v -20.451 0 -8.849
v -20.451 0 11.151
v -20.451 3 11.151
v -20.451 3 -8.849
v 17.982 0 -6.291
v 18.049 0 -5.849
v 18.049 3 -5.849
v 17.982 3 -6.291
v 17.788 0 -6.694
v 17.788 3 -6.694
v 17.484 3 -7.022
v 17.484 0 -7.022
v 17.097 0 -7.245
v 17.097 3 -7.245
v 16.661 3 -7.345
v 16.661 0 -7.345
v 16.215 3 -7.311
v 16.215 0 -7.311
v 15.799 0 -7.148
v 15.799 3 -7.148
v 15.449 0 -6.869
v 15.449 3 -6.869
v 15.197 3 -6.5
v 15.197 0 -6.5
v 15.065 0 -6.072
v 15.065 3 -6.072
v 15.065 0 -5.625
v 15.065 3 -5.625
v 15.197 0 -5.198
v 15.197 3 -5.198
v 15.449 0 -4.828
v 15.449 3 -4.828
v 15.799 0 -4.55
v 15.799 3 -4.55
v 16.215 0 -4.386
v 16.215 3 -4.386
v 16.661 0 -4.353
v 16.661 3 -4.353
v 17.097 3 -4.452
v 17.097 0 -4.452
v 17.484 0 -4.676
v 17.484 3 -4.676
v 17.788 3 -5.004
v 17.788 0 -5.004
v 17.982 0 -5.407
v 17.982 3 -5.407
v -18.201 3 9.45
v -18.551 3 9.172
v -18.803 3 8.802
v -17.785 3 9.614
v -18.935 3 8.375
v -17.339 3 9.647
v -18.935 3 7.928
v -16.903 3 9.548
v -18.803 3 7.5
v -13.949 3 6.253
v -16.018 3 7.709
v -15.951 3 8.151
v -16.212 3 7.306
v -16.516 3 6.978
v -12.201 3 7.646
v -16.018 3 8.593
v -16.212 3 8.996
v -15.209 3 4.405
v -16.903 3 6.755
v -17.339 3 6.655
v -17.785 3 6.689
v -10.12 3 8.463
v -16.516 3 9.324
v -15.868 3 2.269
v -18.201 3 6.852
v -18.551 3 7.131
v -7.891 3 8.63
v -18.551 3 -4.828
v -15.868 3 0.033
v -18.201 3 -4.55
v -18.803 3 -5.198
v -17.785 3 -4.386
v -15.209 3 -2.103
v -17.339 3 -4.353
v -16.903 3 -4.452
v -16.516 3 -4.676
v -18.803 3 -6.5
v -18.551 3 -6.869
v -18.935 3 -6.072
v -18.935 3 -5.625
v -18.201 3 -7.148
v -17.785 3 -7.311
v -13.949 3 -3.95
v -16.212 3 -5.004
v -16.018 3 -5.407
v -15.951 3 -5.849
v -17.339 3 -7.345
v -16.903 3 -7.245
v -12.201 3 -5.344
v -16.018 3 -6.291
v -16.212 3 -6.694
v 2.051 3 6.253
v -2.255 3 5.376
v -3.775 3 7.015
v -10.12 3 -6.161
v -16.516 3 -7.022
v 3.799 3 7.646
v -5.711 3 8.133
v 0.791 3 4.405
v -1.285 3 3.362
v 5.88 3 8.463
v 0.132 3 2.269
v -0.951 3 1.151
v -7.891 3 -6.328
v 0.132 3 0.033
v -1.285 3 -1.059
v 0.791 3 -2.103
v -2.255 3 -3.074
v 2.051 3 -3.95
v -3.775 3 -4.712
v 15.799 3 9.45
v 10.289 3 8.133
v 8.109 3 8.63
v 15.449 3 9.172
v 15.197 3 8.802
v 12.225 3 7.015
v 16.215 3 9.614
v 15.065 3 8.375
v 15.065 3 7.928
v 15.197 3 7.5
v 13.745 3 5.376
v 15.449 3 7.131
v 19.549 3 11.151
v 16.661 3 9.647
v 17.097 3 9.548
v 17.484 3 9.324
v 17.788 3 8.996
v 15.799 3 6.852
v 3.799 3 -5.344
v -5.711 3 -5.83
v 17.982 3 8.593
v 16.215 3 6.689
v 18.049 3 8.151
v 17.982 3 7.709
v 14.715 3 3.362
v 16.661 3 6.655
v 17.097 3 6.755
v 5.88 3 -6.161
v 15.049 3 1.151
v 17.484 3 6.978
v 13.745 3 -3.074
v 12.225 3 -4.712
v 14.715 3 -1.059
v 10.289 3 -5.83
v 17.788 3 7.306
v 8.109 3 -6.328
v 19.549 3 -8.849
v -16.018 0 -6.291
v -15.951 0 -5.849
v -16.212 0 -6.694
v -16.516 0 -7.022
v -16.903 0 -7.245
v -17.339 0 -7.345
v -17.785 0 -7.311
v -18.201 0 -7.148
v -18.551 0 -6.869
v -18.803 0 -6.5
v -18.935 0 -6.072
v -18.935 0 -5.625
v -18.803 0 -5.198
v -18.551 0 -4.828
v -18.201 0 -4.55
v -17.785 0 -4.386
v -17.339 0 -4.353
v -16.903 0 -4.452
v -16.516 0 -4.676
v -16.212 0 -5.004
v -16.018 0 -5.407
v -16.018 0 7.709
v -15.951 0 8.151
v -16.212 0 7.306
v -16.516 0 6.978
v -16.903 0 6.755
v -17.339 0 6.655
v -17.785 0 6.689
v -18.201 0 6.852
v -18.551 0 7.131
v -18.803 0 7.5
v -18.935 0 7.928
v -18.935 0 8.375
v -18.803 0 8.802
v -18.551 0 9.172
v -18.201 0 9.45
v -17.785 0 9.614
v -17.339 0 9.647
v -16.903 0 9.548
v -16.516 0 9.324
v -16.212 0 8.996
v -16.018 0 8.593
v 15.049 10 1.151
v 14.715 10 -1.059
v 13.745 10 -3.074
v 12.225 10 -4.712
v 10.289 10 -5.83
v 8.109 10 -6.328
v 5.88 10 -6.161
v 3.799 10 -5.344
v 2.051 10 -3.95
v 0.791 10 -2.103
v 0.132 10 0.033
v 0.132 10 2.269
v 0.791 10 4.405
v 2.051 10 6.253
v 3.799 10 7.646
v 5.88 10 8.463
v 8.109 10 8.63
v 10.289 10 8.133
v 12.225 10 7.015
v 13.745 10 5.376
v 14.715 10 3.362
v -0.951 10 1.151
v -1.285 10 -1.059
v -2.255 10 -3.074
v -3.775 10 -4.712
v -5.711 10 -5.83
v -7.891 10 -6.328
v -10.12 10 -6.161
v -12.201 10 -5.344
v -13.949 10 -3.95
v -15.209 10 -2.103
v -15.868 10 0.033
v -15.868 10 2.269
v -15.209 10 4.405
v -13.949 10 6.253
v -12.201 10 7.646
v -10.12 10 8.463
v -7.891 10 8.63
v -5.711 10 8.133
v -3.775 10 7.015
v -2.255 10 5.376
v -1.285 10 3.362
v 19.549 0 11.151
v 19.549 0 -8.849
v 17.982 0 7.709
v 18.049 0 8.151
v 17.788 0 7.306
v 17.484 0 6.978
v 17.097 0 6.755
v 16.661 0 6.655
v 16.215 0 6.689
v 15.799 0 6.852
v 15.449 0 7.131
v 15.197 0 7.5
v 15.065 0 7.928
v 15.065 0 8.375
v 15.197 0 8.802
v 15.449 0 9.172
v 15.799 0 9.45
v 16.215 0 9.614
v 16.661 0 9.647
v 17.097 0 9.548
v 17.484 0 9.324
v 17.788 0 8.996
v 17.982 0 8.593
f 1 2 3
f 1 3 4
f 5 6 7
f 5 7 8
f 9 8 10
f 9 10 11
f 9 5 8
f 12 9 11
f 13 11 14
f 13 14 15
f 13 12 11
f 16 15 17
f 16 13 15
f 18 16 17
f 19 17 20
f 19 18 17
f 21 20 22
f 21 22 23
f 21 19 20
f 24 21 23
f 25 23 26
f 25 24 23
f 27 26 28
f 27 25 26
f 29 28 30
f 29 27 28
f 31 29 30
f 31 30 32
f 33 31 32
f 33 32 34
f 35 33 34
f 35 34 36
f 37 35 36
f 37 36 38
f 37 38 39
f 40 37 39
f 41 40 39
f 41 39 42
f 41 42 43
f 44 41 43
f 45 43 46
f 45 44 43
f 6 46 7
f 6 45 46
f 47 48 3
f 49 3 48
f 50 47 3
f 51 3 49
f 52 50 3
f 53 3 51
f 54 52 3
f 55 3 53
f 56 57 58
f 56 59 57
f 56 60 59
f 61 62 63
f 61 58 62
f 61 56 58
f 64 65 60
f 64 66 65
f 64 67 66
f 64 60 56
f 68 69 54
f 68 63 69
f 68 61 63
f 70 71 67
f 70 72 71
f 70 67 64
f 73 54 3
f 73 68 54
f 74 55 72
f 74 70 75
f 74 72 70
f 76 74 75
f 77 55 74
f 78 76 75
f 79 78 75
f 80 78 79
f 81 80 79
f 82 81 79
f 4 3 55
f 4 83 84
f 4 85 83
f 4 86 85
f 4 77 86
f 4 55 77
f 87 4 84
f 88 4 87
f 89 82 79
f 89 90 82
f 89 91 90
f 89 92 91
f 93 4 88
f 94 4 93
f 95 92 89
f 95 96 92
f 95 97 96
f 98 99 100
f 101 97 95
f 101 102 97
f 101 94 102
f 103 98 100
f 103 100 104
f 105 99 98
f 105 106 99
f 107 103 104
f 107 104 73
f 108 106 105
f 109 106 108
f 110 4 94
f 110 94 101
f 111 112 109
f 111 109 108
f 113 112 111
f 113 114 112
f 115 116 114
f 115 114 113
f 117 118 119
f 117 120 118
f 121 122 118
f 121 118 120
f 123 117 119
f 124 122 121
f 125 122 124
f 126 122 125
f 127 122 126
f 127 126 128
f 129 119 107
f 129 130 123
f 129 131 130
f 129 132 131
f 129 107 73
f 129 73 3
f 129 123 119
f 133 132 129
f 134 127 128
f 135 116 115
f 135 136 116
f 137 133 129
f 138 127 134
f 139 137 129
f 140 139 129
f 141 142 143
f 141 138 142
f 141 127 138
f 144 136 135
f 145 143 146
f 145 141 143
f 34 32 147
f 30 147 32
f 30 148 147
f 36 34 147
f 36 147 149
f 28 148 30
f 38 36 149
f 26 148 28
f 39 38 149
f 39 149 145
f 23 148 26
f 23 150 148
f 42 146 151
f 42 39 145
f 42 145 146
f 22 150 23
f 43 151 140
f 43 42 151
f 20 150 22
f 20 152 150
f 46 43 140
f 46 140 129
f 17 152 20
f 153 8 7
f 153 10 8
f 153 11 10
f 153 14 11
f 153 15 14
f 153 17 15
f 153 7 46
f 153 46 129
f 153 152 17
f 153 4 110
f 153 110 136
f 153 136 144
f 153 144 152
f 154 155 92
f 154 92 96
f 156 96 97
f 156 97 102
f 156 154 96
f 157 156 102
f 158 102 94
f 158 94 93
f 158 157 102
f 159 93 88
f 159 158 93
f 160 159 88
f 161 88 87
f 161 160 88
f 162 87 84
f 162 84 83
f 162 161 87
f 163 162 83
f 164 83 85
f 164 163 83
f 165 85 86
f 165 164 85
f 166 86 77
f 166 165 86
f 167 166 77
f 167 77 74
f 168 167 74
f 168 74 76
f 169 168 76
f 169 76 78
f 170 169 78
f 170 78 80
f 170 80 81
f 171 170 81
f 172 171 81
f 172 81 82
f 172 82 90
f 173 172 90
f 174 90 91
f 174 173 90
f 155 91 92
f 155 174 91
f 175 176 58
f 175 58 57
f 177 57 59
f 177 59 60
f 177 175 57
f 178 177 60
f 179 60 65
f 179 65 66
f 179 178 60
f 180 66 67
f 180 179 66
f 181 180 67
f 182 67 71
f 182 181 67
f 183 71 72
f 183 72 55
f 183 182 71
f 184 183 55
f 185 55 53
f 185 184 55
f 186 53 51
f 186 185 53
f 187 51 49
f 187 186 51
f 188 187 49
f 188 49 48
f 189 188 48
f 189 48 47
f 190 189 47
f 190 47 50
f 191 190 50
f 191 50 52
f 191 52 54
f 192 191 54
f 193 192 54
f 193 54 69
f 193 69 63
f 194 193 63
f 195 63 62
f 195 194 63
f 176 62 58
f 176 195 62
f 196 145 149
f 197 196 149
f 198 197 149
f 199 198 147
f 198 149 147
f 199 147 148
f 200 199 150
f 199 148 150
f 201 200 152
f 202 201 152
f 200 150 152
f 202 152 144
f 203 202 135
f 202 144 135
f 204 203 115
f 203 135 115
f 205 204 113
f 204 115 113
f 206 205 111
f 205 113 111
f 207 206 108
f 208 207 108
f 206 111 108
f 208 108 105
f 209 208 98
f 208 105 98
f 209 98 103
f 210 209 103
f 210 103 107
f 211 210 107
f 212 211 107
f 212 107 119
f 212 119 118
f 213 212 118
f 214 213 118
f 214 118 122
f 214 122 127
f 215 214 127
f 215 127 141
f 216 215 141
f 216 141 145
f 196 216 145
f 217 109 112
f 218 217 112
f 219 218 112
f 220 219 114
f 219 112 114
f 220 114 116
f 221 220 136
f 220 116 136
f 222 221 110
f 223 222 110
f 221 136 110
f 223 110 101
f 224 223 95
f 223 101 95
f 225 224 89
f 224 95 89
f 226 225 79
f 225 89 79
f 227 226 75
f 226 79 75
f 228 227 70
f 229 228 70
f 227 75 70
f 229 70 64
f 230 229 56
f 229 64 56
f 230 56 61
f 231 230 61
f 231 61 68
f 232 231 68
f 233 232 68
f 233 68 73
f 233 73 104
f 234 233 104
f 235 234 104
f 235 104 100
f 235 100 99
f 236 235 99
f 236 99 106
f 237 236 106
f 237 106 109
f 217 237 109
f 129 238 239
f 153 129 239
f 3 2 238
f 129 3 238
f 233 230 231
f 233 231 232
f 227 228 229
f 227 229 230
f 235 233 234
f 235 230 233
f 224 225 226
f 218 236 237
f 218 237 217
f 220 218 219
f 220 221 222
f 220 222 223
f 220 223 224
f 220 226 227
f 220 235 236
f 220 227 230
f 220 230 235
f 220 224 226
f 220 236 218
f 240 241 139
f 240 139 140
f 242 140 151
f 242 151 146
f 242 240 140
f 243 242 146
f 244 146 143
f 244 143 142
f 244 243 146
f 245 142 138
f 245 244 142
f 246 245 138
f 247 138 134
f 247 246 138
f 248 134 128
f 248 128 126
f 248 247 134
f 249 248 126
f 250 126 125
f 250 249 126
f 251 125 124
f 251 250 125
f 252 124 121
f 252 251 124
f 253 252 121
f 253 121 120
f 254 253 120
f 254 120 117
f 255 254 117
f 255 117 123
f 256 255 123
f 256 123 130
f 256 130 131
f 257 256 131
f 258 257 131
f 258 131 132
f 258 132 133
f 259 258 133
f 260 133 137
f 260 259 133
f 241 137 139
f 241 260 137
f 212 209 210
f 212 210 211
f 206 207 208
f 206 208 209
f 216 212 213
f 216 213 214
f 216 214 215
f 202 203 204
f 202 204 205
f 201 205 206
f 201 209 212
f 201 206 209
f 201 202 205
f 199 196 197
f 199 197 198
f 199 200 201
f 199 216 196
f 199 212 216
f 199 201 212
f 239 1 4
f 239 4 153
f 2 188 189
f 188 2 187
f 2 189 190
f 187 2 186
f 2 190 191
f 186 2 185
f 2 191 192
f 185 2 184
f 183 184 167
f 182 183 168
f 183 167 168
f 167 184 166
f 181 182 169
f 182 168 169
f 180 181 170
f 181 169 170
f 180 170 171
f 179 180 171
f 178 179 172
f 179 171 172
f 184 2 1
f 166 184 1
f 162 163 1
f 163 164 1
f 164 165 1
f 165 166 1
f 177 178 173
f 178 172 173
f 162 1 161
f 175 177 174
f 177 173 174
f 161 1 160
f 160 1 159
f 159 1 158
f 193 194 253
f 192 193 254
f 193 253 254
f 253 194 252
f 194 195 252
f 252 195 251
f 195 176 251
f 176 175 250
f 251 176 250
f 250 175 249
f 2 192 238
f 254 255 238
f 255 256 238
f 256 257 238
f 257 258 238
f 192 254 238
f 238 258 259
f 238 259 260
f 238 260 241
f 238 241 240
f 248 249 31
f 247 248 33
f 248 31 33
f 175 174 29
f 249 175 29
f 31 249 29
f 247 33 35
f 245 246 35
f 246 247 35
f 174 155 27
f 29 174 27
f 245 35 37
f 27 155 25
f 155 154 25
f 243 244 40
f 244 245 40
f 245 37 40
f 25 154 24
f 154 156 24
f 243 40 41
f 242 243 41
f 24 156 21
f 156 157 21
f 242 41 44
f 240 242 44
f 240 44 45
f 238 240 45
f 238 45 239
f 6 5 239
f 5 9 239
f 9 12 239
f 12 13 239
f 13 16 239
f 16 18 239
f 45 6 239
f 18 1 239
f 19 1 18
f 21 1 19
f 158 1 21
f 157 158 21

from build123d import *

# Parameters (mm, degrees)
SKETCH1_W           = 40
SKETCH1_H           = 20
SKETCH1_R           = 1.5
SKETCH1_R_2         = 7.5
BOSS_EXTRUDE1_DEPTH = 3
SKETCH1_2_R         = 7.5
BOSS_EXTRUDE2_DEPTH = 10


with BuildPart() as part:
    # Sketch1 → Boss-Extrude1 (new body)
    with BuildSketch(Plane(origin=(0, 0, 0), x_dir=(1, 0, 0), z_dir=(0, 1, 0))):
        with Locations((-0.451467269, -1.151241535)):
            Rectangle(SKETCH1_W, SKETCH1_H)
        with Locations((-17.451467269, 5.848758465)):
            Circle(SKETCH1_R, mode=Mode.SUBTRACT)
        with Locations((-17.451467269, -8.151241535)):
            Circle(SKETCH1_R, mode=Mode.SUBTRACT)
        with Locations((-8.451467269, -1.151241535)):
            Circle(SKETCH1_R_2, mode=Mode.SUBTRACT)
        with Locations((16.548532731, -8.151241535)):
            Circle(SKETCH1_R, mode=Mode.SUBTRACT)
        with Locations((16.548532731, 5.848758465)):
            Circle(SKETCH1_R, mode=Mode.SUBTRACT)
        with Locations((7.548532731, -1.151241535)):
            Circle(SKETCH1_R_2, mode=Mode.SUBTRACT)
    extrude(amount=BOSS_EXTRUDE1_DEPTH)

    # Sketch1<2> → Boss-Extrude2 (add)
    with BuildSketch(Plane(origin=(0, 0, 0), x_dir=(1, 0, 0), z_dir=(0, 1, 0))):
        with Locations((-8.451467269, -1.151241535)):
            Circle(SKETCH1_2_R)
        with Locations((7.548532731, -1.151241535)):
            Circle(SKETCH1_2_R)
    extrude(amount=BOSS_EXTRUDE2_DEPTH)


solid = part.part
